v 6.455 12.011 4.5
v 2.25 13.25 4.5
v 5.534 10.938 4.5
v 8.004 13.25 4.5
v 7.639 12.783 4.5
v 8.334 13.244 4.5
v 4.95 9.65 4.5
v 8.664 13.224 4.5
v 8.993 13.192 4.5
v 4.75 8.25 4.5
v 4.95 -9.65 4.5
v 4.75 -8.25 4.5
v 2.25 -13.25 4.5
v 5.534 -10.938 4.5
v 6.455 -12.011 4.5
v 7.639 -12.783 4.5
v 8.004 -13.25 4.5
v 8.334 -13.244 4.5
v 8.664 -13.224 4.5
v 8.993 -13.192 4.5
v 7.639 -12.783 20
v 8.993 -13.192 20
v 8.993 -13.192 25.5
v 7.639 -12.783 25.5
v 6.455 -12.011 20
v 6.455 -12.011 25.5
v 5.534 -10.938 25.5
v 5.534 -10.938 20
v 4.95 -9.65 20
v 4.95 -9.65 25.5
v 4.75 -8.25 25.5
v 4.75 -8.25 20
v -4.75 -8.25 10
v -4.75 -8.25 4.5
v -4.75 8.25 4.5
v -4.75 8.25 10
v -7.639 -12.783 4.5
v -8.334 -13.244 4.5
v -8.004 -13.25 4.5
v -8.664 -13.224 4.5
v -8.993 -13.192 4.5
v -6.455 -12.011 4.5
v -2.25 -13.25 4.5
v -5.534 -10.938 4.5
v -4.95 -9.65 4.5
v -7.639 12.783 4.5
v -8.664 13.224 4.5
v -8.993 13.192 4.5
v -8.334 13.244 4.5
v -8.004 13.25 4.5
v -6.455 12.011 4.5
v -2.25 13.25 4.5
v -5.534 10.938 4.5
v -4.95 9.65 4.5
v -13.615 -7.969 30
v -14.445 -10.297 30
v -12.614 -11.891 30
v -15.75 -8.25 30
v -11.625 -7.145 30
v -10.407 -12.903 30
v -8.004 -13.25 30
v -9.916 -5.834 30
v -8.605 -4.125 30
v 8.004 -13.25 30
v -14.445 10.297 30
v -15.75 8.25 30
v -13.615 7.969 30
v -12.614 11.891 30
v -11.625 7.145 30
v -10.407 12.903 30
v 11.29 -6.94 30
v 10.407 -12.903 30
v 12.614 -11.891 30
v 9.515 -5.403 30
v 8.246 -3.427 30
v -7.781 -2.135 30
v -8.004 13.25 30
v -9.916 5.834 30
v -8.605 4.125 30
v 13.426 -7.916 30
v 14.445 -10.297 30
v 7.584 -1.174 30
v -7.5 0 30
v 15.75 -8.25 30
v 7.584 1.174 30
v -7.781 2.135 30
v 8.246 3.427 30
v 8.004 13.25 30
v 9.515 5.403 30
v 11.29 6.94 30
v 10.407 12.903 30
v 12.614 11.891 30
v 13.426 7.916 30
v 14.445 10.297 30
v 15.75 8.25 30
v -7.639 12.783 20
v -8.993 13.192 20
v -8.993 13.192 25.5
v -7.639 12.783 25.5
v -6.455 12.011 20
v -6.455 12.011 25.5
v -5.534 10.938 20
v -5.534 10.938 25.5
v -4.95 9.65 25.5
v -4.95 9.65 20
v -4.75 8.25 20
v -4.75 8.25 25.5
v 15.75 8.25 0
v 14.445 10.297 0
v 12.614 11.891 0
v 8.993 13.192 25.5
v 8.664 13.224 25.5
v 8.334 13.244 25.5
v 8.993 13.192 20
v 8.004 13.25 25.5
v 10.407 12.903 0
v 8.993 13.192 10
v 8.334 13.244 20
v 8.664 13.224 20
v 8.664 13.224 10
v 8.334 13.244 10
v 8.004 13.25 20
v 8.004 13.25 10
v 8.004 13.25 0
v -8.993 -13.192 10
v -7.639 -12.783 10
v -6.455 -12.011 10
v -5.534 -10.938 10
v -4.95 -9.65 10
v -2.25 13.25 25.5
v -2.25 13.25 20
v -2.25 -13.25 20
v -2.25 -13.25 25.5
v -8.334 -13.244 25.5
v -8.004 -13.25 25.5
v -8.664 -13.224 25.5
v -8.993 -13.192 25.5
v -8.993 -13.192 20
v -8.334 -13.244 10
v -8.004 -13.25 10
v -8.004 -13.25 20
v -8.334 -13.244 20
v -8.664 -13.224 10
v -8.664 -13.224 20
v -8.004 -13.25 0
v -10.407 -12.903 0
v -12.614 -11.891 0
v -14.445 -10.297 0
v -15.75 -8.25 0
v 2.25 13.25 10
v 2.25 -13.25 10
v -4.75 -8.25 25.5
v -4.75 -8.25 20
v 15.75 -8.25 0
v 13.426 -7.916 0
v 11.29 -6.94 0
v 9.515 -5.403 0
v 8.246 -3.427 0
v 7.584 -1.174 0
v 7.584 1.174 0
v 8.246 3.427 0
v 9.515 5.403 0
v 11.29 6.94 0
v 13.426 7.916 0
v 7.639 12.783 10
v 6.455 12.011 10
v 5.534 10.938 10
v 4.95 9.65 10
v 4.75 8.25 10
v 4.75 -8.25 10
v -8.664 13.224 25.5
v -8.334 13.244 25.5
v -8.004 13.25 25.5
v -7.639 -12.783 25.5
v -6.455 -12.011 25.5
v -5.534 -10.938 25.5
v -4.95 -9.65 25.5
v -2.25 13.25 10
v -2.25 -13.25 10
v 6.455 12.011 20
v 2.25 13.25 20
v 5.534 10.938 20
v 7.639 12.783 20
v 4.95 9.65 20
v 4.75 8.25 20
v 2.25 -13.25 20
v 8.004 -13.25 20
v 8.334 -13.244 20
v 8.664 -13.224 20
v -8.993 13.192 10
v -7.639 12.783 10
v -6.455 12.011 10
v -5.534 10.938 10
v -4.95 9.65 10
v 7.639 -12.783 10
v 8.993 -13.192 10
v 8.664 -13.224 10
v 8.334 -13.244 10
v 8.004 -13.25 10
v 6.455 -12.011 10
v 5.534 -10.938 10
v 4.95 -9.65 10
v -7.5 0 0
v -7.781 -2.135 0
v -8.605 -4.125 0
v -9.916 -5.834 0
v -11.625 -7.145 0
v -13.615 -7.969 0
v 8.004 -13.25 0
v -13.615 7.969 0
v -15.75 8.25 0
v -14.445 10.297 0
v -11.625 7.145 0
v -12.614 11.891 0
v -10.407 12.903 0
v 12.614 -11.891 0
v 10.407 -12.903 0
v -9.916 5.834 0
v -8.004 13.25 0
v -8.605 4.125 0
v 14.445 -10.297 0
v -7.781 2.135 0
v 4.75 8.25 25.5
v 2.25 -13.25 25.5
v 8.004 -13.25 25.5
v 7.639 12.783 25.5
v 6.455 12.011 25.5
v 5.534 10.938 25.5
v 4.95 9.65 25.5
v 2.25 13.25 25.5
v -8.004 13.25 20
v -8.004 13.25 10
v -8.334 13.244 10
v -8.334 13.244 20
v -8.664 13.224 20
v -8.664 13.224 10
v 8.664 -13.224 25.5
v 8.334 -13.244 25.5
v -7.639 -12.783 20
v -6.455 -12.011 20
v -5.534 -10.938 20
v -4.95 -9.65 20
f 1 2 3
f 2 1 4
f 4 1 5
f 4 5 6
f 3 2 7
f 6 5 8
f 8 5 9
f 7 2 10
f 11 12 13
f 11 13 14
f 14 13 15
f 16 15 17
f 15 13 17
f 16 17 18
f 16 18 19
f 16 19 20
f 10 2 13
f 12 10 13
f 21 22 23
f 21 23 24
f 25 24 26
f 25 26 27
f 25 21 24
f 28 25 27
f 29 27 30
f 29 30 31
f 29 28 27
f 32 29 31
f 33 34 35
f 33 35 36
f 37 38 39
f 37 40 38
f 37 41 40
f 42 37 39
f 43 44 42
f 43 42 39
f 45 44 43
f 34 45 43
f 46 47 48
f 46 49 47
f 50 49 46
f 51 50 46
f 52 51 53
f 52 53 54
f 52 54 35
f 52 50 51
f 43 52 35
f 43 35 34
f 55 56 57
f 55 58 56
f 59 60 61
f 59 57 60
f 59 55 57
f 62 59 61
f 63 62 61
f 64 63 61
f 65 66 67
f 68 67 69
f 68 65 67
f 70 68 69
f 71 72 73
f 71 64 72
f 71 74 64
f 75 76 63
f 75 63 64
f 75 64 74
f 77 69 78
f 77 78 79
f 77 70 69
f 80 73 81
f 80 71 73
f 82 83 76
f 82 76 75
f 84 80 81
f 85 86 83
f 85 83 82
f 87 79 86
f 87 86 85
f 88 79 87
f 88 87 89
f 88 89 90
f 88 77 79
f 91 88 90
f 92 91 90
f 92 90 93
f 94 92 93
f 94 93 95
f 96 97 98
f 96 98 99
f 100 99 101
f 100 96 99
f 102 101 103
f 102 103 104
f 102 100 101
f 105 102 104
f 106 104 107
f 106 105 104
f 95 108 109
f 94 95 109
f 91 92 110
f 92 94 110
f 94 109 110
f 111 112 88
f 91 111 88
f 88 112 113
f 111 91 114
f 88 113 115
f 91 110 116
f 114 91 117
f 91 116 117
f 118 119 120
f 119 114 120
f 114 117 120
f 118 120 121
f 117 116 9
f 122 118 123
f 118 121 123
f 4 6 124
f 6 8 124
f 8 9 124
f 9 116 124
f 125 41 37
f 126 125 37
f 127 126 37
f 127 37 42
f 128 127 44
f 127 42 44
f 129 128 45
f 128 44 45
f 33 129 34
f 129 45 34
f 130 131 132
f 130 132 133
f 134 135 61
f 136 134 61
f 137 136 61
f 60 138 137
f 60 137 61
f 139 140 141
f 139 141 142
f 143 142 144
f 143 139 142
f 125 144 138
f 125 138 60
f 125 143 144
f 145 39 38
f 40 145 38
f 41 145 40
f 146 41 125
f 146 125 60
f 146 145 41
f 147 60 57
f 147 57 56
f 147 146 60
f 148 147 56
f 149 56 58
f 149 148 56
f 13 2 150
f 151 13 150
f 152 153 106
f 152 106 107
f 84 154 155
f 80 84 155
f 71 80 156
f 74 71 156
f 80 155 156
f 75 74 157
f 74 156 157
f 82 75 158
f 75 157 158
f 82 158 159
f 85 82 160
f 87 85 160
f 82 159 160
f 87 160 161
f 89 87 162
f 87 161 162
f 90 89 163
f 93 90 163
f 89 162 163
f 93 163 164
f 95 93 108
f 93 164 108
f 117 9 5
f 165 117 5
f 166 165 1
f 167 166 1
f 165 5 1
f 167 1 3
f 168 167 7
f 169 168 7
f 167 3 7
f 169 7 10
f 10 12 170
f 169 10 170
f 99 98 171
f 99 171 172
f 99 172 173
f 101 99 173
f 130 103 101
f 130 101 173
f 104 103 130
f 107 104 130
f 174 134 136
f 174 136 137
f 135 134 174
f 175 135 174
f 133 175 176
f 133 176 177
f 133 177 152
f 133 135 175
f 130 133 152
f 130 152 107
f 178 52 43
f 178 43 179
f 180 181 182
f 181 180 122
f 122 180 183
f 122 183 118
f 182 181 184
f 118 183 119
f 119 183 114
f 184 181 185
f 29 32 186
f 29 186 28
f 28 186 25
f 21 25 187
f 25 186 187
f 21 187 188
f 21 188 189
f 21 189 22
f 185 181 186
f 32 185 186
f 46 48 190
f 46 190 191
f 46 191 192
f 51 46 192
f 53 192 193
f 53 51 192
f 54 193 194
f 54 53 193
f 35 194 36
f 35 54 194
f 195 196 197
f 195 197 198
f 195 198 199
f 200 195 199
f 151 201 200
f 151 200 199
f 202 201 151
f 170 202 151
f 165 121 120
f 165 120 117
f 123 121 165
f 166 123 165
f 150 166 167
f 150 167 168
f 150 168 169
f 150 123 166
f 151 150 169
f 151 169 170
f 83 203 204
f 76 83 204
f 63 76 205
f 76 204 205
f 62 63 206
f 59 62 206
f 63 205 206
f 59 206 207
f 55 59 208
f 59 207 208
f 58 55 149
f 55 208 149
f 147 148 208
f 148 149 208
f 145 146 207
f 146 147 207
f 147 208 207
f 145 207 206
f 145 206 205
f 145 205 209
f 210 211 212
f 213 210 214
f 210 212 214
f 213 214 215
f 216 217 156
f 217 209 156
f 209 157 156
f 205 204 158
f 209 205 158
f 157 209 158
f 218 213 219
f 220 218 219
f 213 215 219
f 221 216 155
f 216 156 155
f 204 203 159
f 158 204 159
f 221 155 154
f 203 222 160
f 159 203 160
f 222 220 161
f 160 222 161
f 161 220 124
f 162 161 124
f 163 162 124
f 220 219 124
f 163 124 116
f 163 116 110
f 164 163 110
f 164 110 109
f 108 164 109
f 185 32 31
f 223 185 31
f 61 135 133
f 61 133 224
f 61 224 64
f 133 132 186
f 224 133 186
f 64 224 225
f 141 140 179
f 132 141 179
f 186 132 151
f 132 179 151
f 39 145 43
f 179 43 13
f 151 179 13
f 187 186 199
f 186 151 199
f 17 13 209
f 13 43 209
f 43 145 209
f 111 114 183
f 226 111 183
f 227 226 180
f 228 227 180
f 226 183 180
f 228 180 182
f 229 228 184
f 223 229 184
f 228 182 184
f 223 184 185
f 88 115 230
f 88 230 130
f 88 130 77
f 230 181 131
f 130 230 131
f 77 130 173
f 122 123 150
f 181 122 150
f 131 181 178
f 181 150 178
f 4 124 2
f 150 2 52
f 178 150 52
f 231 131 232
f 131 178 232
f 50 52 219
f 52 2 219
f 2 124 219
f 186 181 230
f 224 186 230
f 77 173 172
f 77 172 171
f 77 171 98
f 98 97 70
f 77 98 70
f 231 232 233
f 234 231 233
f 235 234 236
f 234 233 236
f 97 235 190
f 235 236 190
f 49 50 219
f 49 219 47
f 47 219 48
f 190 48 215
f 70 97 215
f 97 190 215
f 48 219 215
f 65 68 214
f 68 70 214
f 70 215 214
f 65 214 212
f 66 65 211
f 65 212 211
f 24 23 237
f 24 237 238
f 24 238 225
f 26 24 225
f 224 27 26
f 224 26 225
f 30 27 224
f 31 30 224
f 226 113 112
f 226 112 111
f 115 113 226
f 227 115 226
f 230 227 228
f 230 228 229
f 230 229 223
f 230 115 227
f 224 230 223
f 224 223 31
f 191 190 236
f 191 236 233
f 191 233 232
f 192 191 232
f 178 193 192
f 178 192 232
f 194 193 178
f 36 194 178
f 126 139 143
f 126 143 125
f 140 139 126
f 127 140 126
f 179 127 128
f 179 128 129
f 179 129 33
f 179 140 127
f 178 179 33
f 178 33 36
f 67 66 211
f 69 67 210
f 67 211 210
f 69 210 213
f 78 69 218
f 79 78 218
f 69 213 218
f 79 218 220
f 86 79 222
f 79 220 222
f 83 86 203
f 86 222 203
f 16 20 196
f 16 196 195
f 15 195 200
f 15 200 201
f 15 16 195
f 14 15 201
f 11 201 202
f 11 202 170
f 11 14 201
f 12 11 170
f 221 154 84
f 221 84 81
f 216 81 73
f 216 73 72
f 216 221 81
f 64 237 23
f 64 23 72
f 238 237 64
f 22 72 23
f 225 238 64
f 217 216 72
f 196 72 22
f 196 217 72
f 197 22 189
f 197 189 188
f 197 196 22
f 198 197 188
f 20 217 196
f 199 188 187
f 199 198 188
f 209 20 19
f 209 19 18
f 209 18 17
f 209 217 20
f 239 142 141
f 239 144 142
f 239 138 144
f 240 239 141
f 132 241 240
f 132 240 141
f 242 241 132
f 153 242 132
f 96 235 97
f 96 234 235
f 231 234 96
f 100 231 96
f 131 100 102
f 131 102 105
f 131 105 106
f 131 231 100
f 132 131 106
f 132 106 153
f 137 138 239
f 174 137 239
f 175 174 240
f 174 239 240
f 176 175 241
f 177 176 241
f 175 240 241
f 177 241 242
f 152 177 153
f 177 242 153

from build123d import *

# Parameters (mm, degrees)
F1_DEPTH     = 30
F2_W         = 2.5
F2_H         = 5.5
F3_DEPTH     = 27
F4_T1_DEPTH  = 68.7298334621
F5_T1_DEPTH  = 5.5
F5_T3_DEPTH  = 5.5
F5_T8_DEPTH  = 30.5
F5_T13_DEPTH = 30.5
F5_T18_DEPTH = 30.5
F5_T23_DEPTH = 30.5
F5_T28_DEPTH = 30.5
F5_T33_DEPTH = 30.5
F5_T38_DEPTH = 30.5
F5_T43_DEPTH = 30.5


# Not quite as in the source:
# - a fillet or chamfer that OpenCascade refuses, or shapes differently, is made with other operations: its cross-section is extruded or revolved along the edge and cut away or added


with BuildPart() as f1:
    # F0 (on Top) → F1 (new body)
    with BuildSketch(Plane.XY):
        with BuildLine():
            Line((15.75, 13.25), (-15.75, 13.25))
            Line((-15.75, 13.25), (-15.75, 8.25))
            ThreePointArc((-15.75, 8.25), (-9.9163690552, 5.8336309448), (-7.5, 0))
            ThreePointArc((-7.5, 0), (-9.9163690552, -5.8336309448), (-15.75, -8.25))
            Line((-15.75, -8.25), (-15.75, -13.25))
            Line((-15.75, -13.25), (15.75, -13.25))
            Line((15.75, -13.25), (15.75, -8.25))
            ThreePointArc((15.75, -8.25), (7.5, 0), (15.75, 8.25))
            Line((15.75, 8.25), (15.75, 13.25))
        make_face()
    extrude(amount=F1_DEPTH)

    # F2 (on face) → F3 (cut)
    with BuildSketch(Plane.XZ.offset(13.25)):
        with Locations((-3.5, 22.75)):
            Rectangle(F2_W, F2_H)
        with Locations((-3.5, 7.25)):
            Rectangle(F2_W, F2_H)
        with Locations((3.5, 22.75)):
            Rectangle(F2_W, F2_H)
        with Locations((3.5, 7.25)):
            Rectangle(F2_W, F2_H)
    extrude(amount=-F3_DEPTH, mode=Mode.SUBTRACT)

    # F4: fillet of radius 8.5 on 4 edges, made by hand

    # F4_s2 → F4_t1 (cut)
    with BuildSketch(Plane.XY.offset(-19.364916731)):
        with BuildLine():
            ThreePointArc((-8.0040333076, 13.25), (-12.6138055362, 11.8914284285), (-15.75, 8.25))
            Line((-15.75, 8.25), (-15.75, 13.25))
            Line((-15.75, 13.25), (-8.0040333076, 13.25))
        make_face()
        with BuildLine():
            ThreePointArc((-8.0040333076, -13.25), (-12.6138055362, -11.8914284285), (-15.75, -8.25))
            Line((-15.75, -8.25), (-15.75, -13.25))
            Line((-15.75, -13.25), (-8.0040333076, -13.25))
        make_face()
        with BuildLine():
            ThreePointArc((15.75, -8.25), (12.6138055362, -11.8914284285), (8.0040333076, -13.25))
            Line((8.0040333076, -13.25), (15.75, -13.25))
            Line((15.75, -13.25), (15.75, -8.25))
        make_face()
        with BuildLine():
            ThreePointArc((15.75, 8.25), (12.6138055362, 11.8914284285), (8.0040333076, 13.25))
            Line((8.0040333076, 13.25), (15.75, 13.25))
            Line((15.75, 13.25), (15.75, 8.25))
        make_face()
    extrude(amount=F4_T1_DEPTH, mode=Mode.SUBTRACT)

    # F5: fillet of radius 5 on 8 edges, made by hand

    # F5_s2 → F5_t1 (cut)
    with BuildSketch(Plane.XY.offset(20)):
        with BuildLine():
            ThreePointArc((-9.75, -13.25), (-6.2144660941, -11.7855339059), (-4.75, -8.25))
            Line((-4.75, -8.25), (-4.75, -13.25))
            Line((-4.75, -13.25), (-9.75, -13.25))
        make_face()
        with BuildLine():
            ThreePointArc((9.75, -13.25), (6.2144660941, -11.7855339059), (4.75, -8.25))
            Line((4.75, -8.25), (4.75, -13.25))
            Line((4.75, -13.25), (9.75, -13.25))
        make_face()
        with BuildLine():
            ThreePointArc((9.75, 13.25), (6.2144660941, 11.7855339059), (4.75, 8.25))
            Line((4.75, 8.25), (4.75, 13.25))
            Line((4.75, 13.25), (9.75, 13.25))
        make_face()
        with BuildLine():
            ThreePointArc((-9.75, 13.25), (-6.2144660941, 11.7855339059), (-4.75, 8.25))
            Line((-4.75, 8.25), (-4.75, 13.25))
            Line((-4.75, 13.25), (-9.75, 13.25))
        make_face()
    extrude(amount=F5_T1_DEPTH, mode=Mode.SUBTRACT)

    # F5_s4 → F5_t3 (cut)
    with BuildSketch(Plane.XY.offset(4.5)):
        with BuildLine():
            ThreePointArc((-9.75, -13.25), (-6.2144660941, -11.7855339059), (-4.75, -8.25))
            Line((-4.75, -8.25), (-4.75, -13.25))
            Line((-4.75, -13.25), (-9.75, -13.25))
        make_face()
        with BuildLine():
            ThreePointArc((9.75, -13.25), (6.2144660941, -11.7855339059), (4.75, -8.25))
            Line((4.75, -8.25), (4.75, -13.25))
            Line((4.75, -13.25), (9.75, -13.25))
        make_face()
        with BuildLine():
            ThreePointArc((9.75, 13.25), (6.2144660941, 11.7855339059), (4.75, 8.25))
            Line((4.75, 8.25), (4.75, 13.25))
            Line((4.75, 13.25), (9.75, 13.25))
        make_face()
        with BuildLine():
            ThreePointArc((-9.75, 13.25), (-6.2144660941, 11.7855339059), (-4.75, 8.25))
            Line((-4.75, 8.25), (-4.75, 13.25))
            Line((-4.75, 13.25), (-9.75, 13.25))
        make_face()
    extrude(amount=F5_T3_DEPTH, mode=Mode.SUBTRACT)


with BuildPart() as f5_tool6:
    # F5_s7 → F5_t8 (new body)
    with BuildSketch(Plane.XY.offset(38)):
        with BuildLine():
            ThreePointArc((-9.75, -13.25), (-6.2144660941, -11.7855339059), (-4.75, -8.25))
            Line((-4.75, -8.25), (-4.75, -13.25))
            Line((-4.75, -13.25), (-9.75, -13.25))
        make_face()
    extrude(amount=-F5_T8_DEPTH)

    split(bisect_by=Plane.XY.offset(10), keep=Keep.BOTTOM)


with BuildPart() as f1_1:
    add(f1.part)

    # F5_t5: cut F5_tool6
    add(f5_tool6.part, mode=Mode.SUBTRACT)


with BuildPart() as f5_tool11:
    # F5_s12 → F5_t13 (new body)
    with BuildSketch(Plane.XY.offset(22.5)):
        with BuildLine():
            ThreePointArc((-9.75, -13.25), (-6.2144660941, -11.7855339059), (-4.75, -8.25))
            Line((-4.75, -8.25), (-4.75, -13.25))
            Line((-4.75, -13.25), (-9.75, -13.25))
        make_face()
    extrude(amount=-F5_T13_DEPTH)

    split(bisect_by=Plane.XY.offset(20), keep=Keep.TOP)


with BuildPart() as f1_2:
    add(f1_1.part)

    # F5_t10: cut F5_tool11
    add(f5_tool11.part, mode=Mode.SUBTRACT)


with BuildPart() as f5_tool16:
    # F5_s17 → F5_t18 (new body)
    with BuildSketch(Plane.XY.offset(7.5)):
        with BuildLine():
            ThreePointArc((9.75, -13.25), (6.2144660941, -11.7855339059), (4.75, -8.25))
            Line((4.75, -8.25), (4.75, -13.25))
            Line((4.75, -13.25), (9.75, -13.25))
        make_face()
    extrude(amount=F5_T18_DEPTH)

    split(bisect_by=Plane.XY.offset(10), keep=Keep.BOTTOM)


with BuildPart() as f1_3:
    add(f1_2.part)

    # F5_t15: cut F5_tool16
    add(f5_tool16.part, mode=Mode.SUBTRACT)


with BuildPart() as f5_tool21:
    # F5_s22 → F5_t23 (new body)
    with BuildSketch(Plane.XY.offset(-8)):
        with BuildLine():
            ThreePointArc((9.75, -13.25), (6.2144660941, -11.7855339059), (4.75, -8.25))
            Line((4.75, -8.25), (4.75, -13.25))
            Line((4.75, -13.25), (9.75, -13.25))
        make_face()
    extrude(amount=F5_T23_DEPTH)

    split(bisect_by=Plane.XY.offset(20), keep=Keep.TOP)


with BuildPart() as f1_4:
    add(f1_3.part)

    # F5_t20: cut F5_tool21
    add(f5_tool21.part, mode=Mode.SUBTRACT)


with BuildPart() as f5_tool26:
    # F5_s27 → F5_t28 (new body)
    with BuildSketch(Plane.XY.offset(7.5)):
        with BuildLine():
            ThreePointArc((9.75, 13.25), (6.2144660941, 11.7855339059), (4.75, 8.25))
            Line((4.75, 8.25), (4.75, 13.25))
            Line((4.75, 13.25), (9.75, 13.25))
        make_face()
    extrude(amount=F5_T28_DEPTH)

    split(bisect_by=Plane.XY.offset(10), keep=Keep.BOTTOM)


with BuildPart() as f1_5:
    add(f1_4.part)

    # F5_t25: cut F5_tool26
    add(f5_tool26.part, mode=Mode.SUBTRACT)


with BuildPart() as f5_tool31:
    # F5_s32 → F5_t33 (new body)
    with BuildSketch(Plane.XY.offset(-8)):
        with BuildLine():
            ThreePointArc((9.75, 13.25), (6.2144660941, 11.7855339059), (4.75, 8.25))
            Line((4.75, 8.25), (4.75, 13.25))
            Line((4.75, 13.25), (9.75, 13.25))
        make_face()
    extrude(amount=F5_T33_DEPTH)

    split(bisect_by=Plane.XY.offset(20), keep=Keep.TOP)


with BuildPart() as f1_6:
    add(f1_5.part)

    # F5_t30: cut F5_tool31
    add(f5_tool31.part, mode=Mode.SUBTRACT)


with BuildPart() as f5_tool36:
    # F5_s37 → F5_t38 (new body)
    with BuildSketch(Plane.XY.offset(38)):
        with BuildLine():
            ThreePointArc((-9.75, 13.25), (-6.2144660941, 11.7855339059), (-4.75, 8.25))
            Line((-4.75, 8.25), (-4.75, 13.25))
            Line((-4.75, 13.25), (-9.75, 13.25))
        make_face()
    extrude(amount=-F5_T38_DEPTH)

    split(bisect_by=Plane.XY.offset(10), keep=Keep.BOTTOM)


with BuildPart() as f1_7:
    add(f1_6.part)

    # F5_t35: cut F5_tool36
    add(f5_tool36.part, mode=Mode.SUBTRACT)


with BuildPart() as f5_tool41:
    # F5_s42 → F5_t43 (new body)
    with BuildSketch(Plane.XY.offset(22.5)):
        with BuildLine():
            ThreePointArc((-9.75, 13.25), (-6.2144660941, 11.7855339059), (-4.75, 8.25))
            Line((-4.75, 8.25), (-4.75, 13.25))
            Line((-4.75, 13.25), (-9.75, 13.25))
        make_face()
    extrude(amount=-F5_T43_DEPTH)

    split(bisect_by=Plane.XY.offset(20), keep=Keep.TOP)


with BuildPart() as f1_8:
    add(f1_7.part)

    # F5_t40: cut F5_tool41
    add(f5_tool41.part, mode=Mode.SUBTRACT)


solid = f1_8.part
